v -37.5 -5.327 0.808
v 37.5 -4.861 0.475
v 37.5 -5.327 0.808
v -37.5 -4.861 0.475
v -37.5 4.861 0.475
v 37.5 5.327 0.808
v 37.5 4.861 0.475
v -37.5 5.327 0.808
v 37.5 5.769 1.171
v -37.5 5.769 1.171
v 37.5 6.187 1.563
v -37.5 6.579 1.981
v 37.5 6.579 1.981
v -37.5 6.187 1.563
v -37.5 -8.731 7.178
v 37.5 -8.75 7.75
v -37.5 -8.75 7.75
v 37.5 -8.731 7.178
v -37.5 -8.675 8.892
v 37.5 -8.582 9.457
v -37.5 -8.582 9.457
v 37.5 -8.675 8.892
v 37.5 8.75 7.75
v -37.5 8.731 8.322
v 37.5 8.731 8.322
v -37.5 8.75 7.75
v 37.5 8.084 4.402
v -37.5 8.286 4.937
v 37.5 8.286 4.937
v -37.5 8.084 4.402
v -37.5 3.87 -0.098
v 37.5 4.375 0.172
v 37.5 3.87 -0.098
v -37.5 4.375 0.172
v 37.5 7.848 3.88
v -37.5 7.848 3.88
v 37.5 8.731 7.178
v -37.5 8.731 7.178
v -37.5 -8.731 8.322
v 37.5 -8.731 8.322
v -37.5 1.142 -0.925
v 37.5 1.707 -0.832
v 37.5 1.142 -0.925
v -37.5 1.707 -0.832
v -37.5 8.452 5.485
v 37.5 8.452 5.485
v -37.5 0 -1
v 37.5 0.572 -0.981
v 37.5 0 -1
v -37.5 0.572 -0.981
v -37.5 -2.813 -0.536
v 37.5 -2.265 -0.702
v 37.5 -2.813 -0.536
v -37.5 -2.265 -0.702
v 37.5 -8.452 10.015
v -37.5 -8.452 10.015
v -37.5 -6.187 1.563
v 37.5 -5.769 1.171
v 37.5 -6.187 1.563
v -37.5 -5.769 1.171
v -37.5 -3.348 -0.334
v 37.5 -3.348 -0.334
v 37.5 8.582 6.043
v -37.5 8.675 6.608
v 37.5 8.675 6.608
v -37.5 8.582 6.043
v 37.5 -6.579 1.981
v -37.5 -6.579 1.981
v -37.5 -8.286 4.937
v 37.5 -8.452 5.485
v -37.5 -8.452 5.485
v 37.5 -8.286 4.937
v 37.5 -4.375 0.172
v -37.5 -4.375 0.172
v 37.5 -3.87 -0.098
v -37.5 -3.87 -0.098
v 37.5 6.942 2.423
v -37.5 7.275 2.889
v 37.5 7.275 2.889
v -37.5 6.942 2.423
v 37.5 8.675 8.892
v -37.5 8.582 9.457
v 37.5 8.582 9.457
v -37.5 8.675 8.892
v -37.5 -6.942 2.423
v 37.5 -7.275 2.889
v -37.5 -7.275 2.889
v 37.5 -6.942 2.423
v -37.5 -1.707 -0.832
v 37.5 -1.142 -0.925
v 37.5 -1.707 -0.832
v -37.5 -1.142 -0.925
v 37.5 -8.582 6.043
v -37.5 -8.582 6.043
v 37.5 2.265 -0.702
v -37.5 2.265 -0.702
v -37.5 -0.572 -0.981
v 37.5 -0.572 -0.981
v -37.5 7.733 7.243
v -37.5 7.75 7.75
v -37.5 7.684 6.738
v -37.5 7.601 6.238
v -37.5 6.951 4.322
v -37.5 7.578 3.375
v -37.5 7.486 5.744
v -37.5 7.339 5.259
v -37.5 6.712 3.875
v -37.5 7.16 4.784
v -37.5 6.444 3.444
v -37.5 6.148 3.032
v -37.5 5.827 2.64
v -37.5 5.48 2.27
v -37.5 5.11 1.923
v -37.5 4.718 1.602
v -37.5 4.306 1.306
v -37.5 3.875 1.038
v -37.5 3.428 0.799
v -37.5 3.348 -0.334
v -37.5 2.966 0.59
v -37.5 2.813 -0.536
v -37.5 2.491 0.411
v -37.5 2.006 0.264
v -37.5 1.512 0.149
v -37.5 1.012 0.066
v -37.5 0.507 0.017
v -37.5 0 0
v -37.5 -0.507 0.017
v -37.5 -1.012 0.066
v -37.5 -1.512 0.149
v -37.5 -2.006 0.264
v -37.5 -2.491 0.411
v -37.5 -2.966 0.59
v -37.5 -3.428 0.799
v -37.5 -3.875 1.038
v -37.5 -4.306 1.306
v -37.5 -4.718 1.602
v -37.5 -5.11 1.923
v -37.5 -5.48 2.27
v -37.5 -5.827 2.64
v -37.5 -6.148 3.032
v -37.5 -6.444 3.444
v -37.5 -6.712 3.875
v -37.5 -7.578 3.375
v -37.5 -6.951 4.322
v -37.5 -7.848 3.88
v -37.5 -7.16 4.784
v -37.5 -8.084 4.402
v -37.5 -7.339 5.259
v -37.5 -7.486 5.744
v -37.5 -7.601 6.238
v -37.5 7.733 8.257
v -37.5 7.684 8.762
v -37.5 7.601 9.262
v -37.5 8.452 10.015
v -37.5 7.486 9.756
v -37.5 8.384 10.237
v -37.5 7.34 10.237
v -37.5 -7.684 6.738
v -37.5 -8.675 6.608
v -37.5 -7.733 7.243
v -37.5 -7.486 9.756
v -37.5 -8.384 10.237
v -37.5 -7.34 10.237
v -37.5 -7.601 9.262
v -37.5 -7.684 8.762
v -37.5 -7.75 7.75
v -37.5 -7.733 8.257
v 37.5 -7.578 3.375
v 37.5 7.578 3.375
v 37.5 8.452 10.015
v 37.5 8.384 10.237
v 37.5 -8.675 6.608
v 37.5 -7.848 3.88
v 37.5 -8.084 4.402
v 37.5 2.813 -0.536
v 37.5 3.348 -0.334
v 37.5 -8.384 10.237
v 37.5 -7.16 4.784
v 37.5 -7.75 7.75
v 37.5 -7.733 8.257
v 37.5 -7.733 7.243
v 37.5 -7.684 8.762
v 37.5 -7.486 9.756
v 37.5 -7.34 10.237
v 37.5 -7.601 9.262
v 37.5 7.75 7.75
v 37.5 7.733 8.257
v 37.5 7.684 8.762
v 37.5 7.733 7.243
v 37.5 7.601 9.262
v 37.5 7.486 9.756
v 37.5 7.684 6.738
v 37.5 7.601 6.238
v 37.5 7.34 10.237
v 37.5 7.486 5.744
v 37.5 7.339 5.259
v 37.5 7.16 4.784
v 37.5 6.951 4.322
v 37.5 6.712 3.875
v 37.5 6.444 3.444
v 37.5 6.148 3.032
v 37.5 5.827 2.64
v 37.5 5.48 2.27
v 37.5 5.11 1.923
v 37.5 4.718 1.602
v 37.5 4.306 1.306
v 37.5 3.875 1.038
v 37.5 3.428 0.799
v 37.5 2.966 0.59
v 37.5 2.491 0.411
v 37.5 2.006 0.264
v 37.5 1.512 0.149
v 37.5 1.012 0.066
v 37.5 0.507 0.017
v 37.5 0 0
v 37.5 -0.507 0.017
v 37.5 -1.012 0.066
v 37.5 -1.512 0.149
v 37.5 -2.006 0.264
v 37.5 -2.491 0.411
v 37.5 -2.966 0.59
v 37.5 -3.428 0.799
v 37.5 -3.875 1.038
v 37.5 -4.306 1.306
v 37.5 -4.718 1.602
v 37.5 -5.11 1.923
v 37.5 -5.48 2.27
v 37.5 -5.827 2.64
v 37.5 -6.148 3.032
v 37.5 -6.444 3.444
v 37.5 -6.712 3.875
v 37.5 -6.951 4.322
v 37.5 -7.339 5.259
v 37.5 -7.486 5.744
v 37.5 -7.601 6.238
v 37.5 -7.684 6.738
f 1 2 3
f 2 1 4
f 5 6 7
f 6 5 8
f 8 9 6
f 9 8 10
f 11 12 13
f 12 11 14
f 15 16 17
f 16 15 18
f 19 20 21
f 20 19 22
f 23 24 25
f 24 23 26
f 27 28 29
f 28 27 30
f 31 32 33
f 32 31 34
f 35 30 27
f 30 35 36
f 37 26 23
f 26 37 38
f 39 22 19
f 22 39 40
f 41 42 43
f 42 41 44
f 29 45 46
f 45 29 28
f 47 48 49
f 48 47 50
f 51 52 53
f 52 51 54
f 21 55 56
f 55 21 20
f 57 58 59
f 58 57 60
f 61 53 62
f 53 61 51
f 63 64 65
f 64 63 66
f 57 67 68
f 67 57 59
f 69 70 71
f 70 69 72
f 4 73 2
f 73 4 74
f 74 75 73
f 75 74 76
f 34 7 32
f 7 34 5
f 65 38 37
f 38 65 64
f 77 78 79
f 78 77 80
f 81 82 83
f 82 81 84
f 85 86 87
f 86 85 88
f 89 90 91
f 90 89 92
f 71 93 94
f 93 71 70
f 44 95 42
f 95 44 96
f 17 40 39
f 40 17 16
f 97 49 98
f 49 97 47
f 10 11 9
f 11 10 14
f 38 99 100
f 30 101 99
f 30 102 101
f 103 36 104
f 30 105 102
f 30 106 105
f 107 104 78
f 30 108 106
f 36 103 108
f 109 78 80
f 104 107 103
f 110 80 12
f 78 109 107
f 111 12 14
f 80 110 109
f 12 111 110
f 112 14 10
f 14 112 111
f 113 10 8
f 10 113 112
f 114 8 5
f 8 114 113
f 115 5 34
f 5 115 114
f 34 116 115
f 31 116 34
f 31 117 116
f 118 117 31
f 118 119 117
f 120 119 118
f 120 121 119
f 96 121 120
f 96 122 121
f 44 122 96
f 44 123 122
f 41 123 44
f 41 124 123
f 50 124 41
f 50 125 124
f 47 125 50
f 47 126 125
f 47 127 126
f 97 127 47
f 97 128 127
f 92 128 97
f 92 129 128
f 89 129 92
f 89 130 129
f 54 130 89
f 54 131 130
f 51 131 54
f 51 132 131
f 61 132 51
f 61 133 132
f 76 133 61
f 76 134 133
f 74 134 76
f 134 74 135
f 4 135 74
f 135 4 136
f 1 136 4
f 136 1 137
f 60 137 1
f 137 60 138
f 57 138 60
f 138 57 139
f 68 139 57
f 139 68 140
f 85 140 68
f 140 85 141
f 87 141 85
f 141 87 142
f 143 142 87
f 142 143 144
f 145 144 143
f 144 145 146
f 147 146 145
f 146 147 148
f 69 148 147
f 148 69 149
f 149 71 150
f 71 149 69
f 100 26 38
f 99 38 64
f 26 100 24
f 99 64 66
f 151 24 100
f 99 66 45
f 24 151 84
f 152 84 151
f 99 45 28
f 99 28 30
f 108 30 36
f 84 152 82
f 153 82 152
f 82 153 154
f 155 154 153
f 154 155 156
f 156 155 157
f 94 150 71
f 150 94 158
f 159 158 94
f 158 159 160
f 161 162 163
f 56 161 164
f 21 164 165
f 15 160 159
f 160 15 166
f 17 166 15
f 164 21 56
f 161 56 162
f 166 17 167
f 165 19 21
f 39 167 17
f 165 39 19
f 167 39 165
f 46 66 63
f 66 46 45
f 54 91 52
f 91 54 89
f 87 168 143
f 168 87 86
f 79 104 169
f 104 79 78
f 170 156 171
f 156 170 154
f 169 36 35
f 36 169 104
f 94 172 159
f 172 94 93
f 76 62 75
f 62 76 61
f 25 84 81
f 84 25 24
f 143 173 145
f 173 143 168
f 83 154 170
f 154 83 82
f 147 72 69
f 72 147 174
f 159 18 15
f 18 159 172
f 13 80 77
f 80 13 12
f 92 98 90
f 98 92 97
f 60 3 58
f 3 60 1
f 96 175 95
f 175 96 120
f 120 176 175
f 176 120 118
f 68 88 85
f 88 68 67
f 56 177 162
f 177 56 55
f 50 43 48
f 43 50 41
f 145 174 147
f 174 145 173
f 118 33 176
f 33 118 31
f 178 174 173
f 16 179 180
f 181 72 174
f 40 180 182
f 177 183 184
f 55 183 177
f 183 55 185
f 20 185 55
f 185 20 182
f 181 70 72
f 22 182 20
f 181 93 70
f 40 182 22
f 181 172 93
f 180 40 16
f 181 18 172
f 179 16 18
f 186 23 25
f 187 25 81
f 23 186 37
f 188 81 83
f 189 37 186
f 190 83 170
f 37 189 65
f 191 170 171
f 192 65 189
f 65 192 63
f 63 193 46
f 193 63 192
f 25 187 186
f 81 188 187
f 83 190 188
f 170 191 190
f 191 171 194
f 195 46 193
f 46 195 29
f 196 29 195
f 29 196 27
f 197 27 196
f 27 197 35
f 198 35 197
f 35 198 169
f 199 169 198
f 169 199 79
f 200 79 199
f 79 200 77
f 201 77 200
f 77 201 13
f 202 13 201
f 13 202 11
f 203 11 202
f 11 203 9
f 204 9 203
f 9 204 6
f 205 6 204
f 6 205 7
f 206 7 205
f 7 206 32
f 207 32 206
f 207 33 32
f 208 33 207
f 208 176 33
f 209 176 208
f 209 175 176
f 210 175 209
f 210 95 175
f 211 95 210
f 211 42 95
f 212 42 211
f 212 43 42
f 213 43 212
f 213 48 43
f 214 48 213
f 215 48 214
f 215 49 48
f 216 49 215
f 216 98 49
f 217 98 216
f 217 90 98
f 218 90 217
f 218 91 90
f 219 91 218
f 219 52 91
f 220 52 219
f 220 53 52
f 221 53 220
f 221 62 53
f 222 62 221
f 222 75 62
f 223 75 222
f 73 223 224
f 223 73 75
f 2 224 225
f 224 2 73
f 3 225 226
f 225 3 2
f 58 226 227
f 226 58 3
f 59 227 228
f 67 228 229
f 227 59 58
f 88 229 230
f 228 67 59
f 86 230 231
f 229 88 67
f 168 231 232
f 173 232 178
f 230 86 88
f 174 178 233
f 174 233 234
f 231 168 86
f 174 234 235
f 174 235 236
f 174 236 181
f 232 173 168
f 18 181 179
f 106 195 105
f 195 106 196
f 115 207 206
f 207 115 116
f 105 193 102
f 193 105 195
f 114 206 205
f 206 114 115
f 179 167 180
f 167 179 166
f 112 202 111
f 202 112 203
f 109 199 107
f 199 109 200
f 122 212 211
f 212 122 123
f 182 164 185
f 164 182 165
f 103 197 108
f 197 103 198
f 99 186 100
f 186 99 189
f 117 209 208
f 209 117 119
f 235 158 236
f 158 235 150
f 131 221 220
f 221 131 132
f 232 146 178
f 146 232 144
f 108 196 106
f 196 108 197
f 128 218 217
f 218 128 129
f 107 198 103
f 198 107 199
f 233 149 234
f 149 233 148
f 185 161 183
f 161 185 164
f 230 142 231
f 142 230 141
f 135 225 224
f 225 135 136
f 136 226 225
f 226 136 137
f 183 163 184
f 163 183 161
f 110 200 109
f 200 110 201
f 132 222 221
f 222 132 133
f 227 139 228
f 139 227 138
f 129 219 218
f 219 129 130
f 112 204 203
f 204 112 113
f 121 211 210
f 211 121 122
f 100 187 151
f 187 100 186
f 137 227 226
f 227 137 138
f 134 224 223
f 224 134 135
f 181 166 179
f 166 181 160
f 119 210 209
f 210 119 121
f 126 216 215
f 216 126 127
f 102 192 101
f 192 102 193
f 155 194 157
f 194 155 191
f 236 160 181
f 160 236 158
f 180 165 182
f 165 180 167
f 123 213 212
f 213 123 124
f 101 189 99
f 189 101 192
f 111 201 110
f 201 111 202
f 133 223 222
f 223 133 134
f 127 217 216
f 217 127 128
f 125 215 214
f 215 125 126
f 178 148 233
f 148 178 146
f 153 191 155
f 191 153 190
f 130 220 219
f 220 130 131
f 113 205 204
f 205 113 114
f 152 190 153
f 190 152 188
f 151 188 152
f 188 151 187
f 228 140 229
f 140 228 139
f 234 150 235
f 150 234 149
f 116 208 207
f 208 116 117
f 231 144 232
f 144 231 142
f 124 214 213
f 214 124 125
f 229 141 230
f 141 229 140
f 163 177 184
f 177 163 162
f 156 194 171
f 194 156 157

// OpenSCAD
// file: insert_shapes.scad
include <rcolyer-threads.scad>;
$fn=96;

module cell_holder(cell_d, wall=1, length=100) {
    radius=cell_d/2+wall;
    difference() {
        tube(radius, length, wall);
        translate([radius+wall, 0, length/2]) cube([radius*1.66, radius*2, length*1.01], center=true);
    }
}

module threaded_top(od1, cell_d, wall=1) {
    od2 = cell_d;
    length = 20;
    nub = 8;
    nub_r = od2/2;
    diameter = 13;
    tolerance=0.4;
    thickness = length;
    ScrewHole(diameter, thickness, tolerance=tolerance, pitch=1) {
        translate([0,0,0]) cylinder(h=thickness-nub, d=od1);
        translate([0,0,length-nub/2]) cylinder(r=nub_r,h=nub,center=true);
        translate([0,0,length-nub+0.125]) cylinder(r1=od1/2, r2=nub_r, h=0.25, center=true);
    }
}

module insert_end(cell_d, pcb_dims, length=16, wall=1) {
    radius=cell_d/2;

    translate([0,0,length/2]) difference() {
        cylinder(r=radius*0.99, h=length, center=true);
        cylinder(r=1.5, h=length*1.01, center=true);
        translate([0.75,0,pcb_dims[1]/2]) {
            cube([pcb_dims[2], radius*2, pcb_dims[1]], center=true);
        }
    }
}

module tube(radius, height, wall=1) {
    difference() {
        translate([0,0,height/2]) cylinder(r=radius, h=height, center=true);
        translate([0,0,height*0.501]) cylinder(r=radius-wall, h=height*1.02, center=true);
    }
}
// file: cell_sizes.scad
// AA-size cell
aa_cell_d=14.5;
aa_cell_w_clearance=1;
aa_cell_h=50.5;
aa_cell_nubbin_h=1.5;
aa_cell_dims = [aa_cell_d, aa_cell_h];

module aa_cell_mockup() {
    translate([0,0,-aa_cell_nubbin_h/2]) cylinder(d=aa_cell_d,h=aa_cell_h-aa_cell_nubbin_h,center=true);
    translate([0,0,aa_cell_h/2-aa_cell_nubbin_h/2]) cylinder(d=aa_cell_d/2,h=aa_cell_nubbin_h,center=true);
}
// main file
include <cell_sizes.scad>
include <insert_shapes.scad>
$fn=96;
count = 1;
cell_d = aa_cell_d + aa_cell_w_clearance;
holder_len = 75; 

cell_holders(count);

module cell_holders(count=1) {
    slot_w = 20;
    start_y = count/2 * -slot_w;
    for(i=[0:count-1]) {
        y = start_y + slot_w/2 + i * slot_w;
        translate([holder_len/2,y,cell_d/2]) rotate([0,-90,0]) {
            cell_holder(cell_d, length=holder_len);
            %translate([0,0,aa_cell_h/2]) aa_cell_mockup();
        }
    }
}
